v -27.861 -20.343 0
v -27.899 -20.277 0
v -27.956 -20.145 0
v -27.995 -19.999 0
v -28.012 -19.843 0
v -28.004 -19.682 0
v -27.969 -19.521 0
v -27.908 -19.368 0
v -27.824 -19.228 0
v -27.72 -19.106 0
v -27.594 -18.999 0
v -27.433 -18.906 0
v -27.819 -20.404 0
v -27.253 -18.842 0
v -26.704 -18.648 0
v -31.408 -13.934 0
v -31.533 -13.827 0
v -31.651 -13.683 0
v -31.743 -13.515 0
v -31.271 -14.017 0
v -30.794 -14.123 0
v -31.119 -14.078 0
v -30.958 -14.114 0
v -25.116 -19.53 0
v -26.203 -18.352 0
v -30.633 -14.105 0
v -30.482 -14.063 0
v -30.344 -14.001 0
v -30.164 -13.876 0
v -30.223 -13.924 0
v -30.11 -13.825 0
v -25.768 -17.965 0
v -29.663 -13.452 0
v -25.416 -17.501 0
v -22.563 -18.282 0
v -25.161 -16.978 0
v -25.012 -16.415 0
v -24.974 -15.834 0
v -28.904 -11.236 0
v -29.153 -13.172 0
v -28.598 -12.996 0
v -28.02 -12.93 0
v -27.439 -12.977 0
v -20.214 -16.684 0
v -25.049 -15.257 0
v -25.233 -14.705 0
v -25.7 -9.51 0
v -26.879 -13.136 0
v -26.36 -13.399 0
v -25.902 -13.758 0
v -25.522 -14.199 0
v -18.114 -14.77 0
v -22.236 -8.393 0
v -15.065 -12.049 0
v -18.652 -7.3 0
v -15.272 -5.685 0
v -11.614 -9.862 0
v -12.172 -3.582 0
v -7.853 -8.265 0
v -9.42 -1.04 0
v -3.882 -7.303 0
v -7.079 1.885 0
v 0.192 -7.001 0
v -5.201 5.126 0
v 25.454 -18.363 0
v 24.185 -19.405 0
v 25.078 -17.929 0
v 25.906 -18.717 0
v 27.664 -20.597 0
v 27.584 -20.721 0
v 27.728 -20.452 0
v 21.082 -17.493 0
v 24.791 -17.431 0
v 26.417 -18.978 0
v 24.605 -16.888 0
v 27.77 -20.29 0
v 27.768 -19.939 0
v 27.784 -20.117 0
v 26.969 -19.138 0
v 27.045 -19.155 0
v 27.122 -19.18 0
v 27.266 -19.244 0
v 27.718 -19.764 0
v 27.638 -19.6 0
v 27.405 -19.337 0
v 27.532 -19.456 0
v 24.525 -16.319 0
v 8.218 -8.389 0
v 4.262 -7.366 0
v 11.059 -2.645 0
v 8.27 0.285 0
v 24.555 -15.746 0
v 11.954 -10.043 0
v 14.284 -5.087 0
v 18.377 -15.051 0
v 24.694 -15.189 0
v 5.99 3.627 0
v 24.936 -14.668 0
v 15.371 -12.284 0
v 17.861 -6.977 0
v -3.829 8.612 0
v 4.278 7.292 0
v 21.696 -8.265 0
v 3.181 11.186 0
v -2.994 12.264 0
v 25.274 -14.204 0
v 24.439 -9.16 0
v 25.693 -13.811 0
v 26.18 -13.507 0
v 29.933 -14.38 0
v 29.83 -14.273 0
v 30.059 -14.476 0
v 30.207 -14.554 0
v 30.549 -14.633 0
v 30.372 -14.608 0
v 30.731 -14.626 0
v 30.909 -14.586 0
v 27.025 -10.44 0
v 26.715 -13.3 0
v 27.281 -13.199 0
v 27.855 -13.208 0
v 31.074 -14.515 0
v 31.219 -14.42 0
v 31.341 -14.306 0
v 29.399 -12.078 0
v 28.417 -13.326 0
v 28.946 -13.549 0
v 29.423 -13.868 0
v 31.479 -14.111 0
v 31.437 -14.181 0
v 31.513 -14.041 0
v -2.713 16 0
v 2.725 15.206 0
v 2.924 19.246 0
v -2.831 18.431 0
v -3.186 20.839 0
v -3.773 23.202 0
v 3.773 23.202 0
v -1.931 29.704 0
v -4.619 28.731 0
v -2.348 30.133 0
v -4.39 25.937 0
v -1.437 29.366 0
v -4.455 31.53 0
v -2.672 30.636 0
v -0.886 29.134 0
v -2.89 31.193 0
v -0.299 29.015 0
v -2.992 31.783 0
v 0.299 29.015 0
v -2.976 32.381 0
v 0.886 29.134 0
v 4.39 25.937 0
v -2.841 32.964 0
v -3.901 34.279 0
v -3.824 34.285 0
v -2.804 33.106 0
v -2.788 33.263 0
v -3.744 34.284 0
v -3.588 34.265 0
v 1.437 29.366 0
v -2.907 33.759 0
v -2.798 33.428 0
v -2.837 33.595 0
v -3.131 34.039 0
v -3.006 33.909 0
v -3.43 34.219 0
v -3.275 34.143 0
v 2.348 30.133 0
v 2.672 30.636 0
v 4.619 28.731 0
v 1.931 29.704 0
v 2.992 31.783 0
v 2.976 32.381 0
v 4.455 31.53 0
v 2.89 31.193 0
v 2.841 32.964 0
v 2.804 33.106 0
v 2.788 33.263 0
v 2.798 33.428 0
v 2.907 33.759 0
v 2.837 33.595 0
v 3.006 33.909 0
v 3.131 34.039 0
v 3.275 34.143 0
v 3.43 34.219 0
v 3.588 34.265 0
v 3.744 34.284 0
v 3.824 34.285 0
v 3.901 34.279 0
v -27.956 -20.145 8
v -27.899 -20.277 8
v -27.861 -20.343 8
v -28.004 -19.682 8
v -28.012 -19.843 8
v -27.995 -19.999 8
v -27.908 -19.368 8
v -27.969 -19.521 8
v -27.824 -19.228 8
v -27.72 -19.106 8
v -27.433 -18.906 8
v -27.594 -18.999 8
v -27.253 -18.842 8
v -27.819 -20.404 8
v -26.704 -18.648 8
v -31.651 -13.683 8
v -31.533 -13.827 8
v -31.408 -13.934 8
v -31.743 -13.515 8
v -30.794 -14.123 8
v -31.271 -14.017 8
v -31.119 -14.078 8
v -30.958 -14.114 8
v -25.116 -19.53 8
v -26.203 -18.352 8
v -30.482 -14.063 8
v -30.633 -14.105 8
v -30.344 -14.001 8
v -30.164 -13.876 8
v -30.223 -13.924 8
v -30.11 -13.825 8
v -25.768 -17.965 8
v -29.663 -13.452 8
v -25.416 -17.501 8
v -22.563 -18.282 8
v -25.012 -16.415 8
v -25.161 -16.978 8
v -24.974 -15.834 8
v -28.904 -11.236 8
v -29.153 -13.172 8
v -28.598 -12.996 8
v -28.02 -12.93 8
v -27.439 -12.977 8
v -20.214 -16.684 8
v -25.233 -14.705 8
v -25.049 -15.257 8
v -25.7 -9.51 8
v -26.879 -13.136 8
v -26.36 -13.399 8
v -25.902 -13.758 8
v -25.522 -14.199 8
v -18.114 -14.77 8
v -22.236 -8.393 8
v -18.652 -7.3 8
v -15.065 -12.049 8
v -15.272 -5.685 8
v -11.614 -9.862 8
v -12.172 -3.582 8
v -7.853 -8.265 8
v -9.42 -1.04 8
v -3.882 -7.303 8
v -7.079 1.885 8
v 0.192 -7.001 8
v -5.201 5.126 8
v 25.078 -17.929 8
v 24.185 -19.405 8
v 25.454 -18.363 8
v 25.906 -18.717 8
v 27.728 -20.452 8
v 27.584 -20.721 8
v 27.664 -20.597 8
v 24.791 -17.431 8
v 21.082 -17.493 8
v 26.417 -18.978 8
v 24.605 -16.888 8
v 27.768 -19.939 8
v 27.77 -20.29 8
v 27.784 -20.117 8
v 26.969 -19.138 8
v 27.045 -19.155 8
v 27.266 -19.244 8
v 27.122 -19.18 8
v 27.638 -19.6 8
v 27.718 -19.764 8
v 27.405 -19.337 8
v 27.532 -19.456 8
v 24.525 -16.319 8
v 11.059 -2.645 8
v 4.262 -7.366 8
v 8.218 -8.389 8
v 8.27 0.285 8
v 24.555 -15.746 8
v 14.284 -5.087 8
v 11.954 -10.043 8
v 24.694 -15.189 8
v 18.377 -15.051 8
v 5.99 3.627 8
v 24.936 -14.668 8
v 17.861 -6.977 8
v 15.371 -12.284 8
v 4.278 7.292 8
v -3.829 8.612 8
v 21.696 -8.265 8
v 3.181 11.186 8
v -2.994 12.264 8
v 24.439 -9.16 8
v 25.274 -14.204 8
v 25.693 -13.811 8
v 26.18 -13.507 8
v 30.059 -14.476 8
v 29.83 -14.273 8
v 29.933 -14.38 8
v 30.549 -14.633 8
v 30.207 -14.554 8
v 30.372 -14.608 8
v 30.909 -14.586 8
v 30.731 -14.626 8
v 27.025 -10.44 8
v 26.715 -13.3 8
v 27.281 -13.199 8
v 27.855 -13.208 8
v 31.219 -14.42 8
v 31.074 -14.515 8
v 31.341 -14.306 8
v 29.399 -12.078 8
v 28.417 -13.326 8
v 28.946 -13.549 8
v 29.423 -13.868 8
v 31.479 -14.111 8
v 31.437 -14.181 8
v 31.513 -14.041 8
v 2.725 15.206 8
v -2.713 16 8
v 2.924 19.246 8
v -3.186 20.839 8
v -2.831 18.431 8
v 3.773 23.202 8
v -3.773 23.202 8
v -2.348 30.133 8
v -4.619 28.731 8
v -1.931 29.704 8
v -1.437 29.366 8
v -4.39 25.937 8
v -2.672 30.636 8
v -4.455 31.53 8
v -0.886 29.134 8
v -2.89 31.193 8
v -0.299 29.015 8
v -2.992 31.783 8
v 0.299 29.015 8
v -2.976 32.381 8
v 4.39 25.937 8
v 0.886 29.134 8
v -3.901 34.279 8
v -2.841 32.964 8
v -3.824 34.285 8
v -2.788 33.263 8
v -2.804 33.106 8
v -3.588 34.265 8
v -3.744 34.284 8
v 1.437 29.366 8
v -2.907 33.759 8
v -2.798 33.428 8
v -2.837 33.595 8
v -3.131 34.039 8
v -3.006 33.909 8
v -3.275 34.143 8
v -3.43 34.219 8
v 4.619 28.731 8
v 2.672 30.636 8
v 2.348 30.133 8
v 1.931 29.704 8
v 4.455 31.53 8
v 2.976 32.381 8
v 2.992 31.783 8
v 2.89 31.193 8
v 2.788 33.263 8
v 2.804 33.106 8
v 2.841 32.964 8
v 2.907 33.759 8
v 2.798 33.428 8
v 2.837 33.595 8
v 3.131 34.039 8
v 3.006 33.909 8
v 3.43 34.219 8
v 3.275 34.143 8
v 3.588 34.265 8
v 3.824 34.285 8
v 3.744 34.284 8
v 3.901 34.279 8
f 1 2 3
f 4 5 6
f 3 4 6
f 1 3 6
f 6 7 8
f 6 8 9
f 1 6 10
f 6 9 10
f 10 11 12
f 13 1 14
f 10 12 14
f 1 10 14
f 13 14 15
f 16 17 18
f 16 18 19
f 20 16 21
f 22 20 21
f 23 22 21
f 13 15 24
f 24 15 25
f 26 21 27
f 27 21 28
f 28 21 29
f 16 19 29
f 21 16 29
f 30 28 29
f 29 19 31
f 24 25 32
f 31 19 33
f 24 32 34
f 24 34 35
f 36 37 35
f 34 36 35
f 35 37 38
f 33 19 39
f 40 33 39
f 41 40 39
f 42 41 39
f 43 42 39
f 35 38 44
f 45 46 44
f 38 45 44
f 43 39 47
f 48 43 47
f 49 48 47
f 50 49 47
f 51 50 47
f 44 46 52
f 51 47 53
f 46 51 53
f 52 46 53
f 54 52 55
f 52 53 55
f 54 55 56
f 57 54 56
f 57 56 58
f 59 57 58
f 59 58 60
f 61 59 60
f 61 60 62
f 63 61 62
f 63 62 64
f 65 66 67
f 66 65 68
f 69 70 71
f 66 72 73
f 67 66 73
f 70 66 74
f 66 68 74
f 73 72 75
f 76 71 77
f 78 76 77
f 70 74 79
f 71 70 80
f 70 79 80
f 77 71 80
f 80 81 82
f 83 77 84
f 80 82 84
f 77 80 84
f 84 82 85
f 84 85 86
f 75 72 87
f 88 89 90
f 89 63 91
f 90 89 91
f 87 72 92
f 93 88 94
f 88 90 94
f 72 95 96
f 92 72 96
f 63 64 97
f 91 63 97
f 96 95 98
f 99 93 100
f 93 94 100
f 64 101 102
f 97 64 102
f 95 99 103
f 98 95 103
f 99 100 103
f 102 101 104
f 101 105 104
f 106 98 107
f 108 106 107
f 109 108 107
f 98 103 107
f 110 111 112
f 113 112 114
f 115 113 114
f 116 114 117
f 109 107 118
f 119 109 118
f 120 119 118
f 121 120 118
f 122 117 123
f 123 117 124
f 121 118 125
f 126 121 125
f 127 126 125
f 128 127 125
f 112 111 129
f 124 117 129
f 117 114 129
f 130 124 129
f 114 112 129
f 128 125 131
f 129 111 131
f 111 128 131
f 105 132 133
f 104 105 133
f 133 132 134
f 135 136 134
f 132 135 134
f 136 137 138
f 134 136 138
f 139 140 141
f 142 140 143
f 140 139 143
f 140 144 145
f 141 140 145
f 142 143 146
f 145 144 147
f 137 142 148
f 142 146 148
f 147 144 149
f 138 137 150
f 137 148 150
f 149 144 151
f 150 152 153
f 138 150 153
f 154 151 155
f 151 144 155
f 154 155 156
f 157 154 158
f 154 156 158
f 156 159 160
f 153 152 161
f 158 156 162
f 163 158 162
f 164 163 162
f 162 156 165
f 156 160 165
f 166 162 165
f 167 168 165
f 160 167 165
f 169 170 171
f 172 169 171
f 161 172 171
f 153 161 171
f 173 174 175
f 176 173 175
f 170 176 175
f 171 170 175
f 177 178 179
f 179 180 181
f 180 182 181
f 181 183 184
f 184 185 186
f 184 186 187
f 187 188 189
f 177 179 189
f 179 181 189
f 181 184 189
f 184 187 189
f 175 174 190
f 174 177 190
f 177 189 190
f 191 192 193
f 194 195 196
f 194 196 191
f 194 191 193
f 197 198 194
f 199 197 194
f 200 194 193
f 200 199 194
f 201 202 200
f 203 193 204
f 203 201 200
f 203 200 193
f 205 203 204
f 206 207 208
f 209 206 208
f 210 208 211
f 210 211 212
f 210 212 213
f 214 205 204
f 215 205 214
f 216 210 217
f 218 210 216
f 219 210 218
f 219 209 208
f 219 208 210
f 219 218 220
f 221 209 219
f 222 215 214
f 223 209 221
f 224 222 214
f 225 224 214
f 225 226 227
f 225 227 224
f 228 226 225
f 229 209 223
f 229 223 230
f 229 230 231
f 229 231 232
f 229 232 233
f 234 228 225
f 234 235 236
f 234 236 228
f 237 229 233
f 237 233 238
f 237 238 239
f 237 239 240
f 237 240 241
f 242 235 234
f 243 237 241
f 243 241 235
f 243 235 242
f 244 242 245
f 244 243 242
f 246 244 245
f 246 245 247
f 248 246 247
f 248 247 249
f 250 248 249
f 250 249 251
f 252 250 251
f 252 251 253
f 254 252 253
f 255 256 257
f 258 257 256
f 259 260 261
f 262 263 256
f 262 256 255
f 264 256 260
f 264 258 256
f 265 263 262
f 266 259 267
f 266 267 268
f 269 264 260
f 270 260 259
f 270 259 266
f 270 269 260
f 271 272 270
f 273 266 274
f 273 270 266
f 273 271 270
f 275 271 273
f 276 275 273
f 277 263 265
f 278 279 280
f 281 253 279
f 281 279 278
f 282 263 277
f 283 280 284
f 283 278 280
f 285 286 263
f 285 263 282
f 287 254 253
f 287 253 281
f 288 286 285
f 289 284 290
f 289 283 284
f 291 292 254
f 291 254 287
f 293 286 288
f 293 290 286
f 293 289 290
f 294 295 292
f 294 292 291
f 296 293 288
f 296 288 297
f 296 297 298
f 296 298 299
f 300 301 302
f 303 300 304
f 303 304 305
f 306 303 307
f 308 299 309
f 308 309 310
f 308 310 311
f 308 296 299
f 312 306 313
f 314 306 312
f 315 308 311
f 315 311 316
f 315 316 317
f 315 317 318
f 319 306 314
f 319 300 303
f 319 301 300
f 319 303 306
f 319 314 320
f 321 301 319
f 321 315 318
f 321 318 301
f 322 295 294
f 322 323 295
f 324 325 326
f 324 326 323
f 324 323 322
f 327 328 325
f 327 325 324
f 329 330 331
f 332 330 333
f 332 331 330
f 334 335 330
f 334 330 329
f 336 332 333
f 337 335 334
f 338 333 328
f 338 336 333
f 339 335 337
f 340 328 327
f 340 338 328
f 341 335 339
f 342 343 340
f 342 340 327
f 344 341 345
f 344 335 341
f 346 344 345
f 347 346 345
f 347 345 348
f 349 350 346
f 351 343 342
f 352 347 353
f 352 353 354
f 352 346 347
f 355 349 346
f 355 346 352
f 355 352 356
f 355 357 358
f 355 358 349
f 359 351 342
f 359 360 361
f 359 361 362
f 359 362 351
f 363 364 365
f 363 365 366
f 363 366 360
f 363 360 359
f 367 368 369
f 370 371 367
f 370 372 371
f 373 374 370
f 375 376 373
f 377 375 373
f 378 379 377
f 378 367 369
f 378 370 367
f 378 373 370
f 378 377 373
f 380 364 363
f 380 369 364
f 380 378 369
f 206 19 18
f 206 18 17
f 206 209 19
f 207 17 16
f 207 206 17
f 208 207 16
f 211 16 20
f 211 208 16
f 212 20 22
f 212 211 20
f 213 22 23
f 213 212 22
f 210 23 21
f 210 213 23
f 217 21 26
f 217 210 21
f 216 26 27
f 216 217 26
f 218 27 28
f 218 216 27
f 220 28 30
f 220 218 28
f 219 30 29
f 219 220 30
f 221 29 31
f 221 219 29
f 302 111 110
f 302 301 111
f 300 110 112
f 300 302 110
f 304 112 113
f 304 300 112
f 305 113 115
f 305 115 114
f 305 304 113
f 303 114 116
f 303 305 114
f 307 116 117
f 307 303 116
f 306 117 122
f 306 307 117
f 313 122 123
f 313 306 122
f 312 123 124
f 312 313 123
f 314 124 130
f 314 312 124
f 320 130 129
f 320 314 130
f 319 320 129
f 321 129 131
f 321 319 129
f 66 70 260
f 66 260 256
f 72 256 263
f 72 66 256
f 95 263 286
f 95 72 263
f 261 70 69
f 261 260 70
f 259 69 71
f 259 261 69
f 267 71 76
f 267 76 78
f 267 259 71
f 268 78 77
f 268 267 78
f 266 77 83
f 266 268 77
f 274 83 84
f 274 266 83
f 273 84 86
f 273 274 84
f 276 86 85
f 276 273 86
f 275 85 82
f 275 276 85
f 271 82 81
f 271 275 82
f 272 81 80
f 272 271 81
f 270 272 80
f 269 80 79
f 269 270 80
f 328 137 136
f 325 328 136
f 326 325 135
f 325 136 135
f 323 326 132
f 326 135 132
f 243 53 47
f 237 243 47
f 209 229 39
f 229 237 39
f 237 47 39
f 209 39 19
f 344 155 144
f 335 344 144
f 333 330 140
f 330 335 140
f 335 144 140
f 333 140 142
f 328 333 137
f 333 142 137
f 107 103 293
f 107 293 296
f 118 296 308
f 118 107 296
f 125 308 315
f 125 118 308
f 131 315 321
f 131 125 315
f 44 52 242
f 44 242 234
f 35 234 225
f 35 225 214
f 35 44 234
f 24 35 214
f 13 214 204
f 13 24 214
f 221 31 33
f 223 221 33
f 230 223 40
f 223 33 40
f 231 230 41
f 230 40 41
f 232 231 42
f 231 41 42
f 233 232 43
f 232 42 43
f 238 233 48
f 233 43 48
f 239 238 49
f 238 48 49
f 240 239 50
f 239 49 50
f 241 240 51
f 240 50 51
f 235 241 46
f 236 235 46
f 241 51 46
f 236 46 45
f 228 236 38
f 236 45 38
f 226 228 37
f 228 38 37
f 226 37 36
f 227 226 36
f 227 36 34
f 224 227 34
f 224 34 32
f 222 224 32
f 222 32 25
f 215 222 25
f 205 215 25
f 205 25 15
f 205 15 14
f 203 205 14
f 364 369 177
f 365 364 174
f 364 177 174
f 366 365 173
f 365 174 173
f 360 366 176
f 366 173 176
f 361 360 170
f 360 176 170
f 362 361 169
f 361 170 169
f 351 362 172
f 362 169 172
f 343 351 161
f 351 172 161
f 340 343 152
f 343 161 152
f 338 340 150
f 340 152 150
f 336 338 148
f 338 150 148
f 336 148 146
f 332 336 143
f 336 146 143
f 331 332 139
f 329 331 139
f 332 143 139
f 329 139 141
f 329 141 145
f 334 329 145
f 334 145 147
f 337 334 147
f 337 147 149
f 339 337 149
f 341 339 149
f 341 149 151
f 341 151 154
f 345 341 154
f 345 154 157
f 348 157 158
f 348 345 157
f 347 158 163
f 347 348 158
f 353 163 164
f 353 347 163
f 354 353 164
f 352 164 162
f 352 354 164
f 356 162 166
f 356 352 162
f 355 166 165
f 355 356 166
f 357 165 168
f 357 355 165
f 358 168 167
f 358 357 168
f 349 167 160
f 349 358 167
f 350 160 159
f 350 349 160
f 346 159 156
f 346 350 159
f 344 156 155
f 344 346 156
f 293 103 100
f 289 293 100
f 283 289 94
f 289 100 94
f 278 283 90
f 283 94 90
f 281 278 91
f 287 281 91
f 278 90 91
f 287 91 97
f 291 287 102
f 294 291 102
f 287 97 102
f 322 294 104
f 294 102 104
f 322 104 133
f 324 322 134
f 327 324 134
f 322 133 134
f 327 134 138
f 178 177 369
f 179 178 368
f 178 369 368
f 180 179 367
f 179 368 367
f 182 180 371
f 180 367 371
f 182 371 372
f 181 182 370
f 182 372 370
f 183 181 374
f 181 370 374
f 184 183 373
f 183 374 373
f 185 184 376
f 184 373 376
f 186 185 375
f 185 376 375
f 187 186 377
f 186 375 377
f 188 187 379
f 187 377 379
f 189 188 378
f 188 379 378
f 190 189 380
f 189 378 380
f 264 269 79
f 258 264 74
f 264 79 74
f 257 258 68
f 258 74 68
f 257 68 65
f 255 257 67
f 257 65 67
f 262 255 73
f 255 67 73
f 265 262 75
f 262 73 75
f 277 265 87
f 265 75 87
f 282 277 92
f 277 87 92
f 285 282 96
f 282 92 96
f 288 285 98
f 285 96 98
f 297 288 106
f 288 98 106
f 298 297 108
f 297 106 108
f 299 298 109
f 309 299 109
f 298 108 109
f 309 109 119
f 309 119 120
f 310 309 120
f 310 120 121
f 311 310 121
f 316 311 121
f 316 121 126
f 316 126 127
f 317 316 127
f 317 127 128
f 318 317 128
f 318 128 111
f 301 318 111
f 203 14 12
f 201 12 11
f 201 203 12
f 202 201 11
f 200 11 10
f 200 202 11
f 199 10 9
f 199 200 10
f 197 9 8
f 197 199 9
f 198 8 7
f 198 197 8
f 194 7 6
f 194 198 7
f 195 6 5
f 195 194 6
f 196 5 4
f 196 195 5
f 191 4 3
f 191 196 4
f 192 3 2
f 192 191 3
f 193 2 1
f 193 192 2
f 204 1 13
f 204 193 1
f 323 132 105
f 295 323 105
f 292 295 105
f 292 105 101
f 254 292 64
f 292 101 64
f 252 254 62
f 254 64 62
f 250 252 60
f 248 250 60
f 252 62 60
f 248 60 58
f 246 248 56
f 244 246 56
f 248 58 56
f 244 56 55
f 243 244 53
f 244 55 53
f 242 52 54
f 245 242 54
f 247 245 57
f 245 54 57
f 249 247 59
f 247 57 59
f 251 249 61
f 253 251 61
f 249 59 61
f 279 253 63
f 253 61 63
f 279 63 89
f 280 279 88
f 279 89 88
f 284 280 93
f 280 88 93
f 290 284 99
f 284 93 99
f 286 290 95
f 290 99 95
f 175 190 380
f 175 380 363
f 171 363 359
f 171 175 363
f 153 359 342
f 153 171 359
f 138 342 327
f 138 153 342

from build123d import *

# Parameters (mm, degrees)
F1_DEPTH    = 8
F2_R        = 1
F3_T1_DEPTH = 64.2226111809
F3_T3_DEPTH = 65.5041643561
F3_T5_DEPTH = 66.9229315715
F3_T7_DEPTH = 64.2892221554
F3_T9_DEPTH = 66.1623607225


# Not quite as in the source:
# - a fillet or chamfer that OpenCascade refuses, or shapes differently, is made with other operations: its cross-section is extruded or revolved along the edge and cut away or added


with BuildPart() as f1:
    # F0 (on Top) → F1 (new body)
    with BuildSketch(Plane.XY):
        with BuildLine():
            ThreePointArc((1.7213359453, 34.45703125), (0, 29), (-1.7213359453, 34.45703125))
            ThreePointArc((-1.7213359453, 34.45703125), (-5.6630518779, 34.0320414232), (-9.5299848811, 33.1576444906))
            ThreePointArc((-9.5299848811, 33.1576444906), (-4.4795318248, 25.2311781209), (-2.7128129211, 16))
            ThreePointArc((-2.7128129211, 16), (-12.2077903389, -3.6110753077), (-33.4803548991, -8.3256132406))
            ThreePointArc((-33.4803548991, -8.3256132406), (-32.3848639744, -11.8941407997), (-30.9102371196, -15.3234213285))
            ThreePointArc((-30.9102371196, -15.3234213285), (-25.3652162283, -14.4450583373), (-28.9498248331, -18.7658637459))
            ThreePointArc((-28.9498248331, -18.7658637459), (-26.6234342426, -21.9418036891), (-23.950370018, -24.83203125))
            ThreePointArc((-23.950370018, -24.83203125), (0, -7), (23.950370018, -24.83203125))
            ThreePointArc((23.950370018, -24.83203125), (26.587584538, -21.9852302339), (28.8884099574, -18.8602696198))
            ThreePointArc((28.8884099574, -18.8602696198), (24.9364218636, -14.6683482508), (30.5204410338, -16.0857912178))
            ThreePointArc((30.5204410338, -16.0857912178), (32.2347725379, -12.2950981871), (33.4803548991, -8.3256132406))
            ThreePointArc((33.4803548991, -8.3256132406), (6.0621778265, 3.5), (9.5299848811, 33.1576444906))
            ThreePointArc((9.5299848811, 33.1576444906), (5.6630518779, 34.0320414232), (1.7213359453, 34.45703125))
        make_face()
    extrude(amount=F1_DEPTH)

    # F2
    f2_edges = [f1.edges().sort_by_distance(p)[0] for p in [
        (-30.910237, -15.323421, 4),
        (-28.949825, -18.765864, 4),
        (1.721336, 34.457031, 4),
        (-1.721336, 34.457031, 4),
        (28.88841, -18.86027, 4),
        (30.520441, -16.085791, 4),
    ]]
    fillet(f2_edges, radius=F2_R)

    # F3: fillet of radius 20 on 6 edges, made by hand

    # F3_s2 → F3_t1 (cut)
    with BuildSketch(Plane.XY.offset(-28.1113055904)):
        with BuildLine():
            ThreePointArc((-22.2360329208, -8.3927218823), (-27.3415731158, -10.3001532277), (-31.7425915451, -13.5150982979))
            ThreePointArc((-31.7425915451, -13.5150982979), (-32.7145361346, -10.9548676622), (-33.4803548991, -8.3256132406))
            ThreePointArc((-33.4803548991, -8.3256132406), (-27.8620158848, -8.9995547655), (-22.2360329208, -8.3927218823))
        make_face()
    extrude(amount=F3_T1_DEPTH, mode=Mode.SUBTRACT)

    # F3_s4 → F3_t3 (cut)
    with BuildSketch(Plane.XY.offset(-28.7520821781)):
        with BuildLine():
            ThreePointArc((-3.9009970628, 34.2787430037), (-4.619010619, 28.731142286), (-3.7725584788, 23.2016815561))
            ThreePointArc((-3.7725584788, 23.2016815561), (-6.0709826163, 28.5152379545), (-9.5299848811, 33.1576444906))
            ThreePointArc((-9.5299848811, 33.1576444906), (-6.7388451877, 33.8354542682), (-3.9009970628, 34.2787430037))
        make_face()
        with BuildLine():
            ThreePointArc((3.9009970628, 34.2787430037), (4.619010619, 28.731142286), (3.7725584788, 23.2016815561))
            ThreePointArc((3.7725584788, 23.2016815561), (6.0709826163, 28.5152379545), (9.5299848811, 33.1576444906))
            ThreePointArc((9.5299848811, 33.1576444906), (6.7388451877, 33.8354542682), (3.9009970628, 34.2787430037))
        make_face()
    extrude(amount=F3_T3_DEPTH, mode=Mode.SUBTRACT)

    # F3_s6 → F3_t5 (cut)
    with BuildSketch(Plane.XY.offset(-29.4614657857)):
        with BuildLine():
            ThreePointArc((21.695923744, -8.2651405236), (27.0245333746, -10.4395796023), (31.513317936, -14.0413956808))
            ThreePointArc((31.513317936, -14.0413956808), (32.6222611015, -11.2266682781), (33.4803548991, -8.3256132406))
            ThreePointArc((33.4803548991, -8.3256132406), (27.5845251828, -8.999670843), (21.695923744, -8.2651405236))
        make_face()
    extrude(amount=F3_T5_DEPTH, mode=Mode.SUBTRACT)

    # F3_s8 → F3_t7 (cut)
    with BuildSketch(Plane.XY.offset(-28.1446110777)):
        with BuildLine():
            ThreePointArc((27.5839500196, -20.7213827076), (22.5899865116, -18.5199962805), (18.3770596718, -15.0505552356))
            ThreePointArc((18.3770596718, -15.0505552356), (21.7214673604, -19.6234958203), (23.950370018, -24.83203125))
            ThreePointArc((23.950370018, -24.83203125), (25.8490017853, -22.8490504552), (27.5839500196, -20.7213827076))
        make_face()
    extrude(amount=F3_T7_DEPTH, mode=Mode.SUBTRACT)

    # F3_s10 → F3_t9 (cut)
    with BuildSketch(Plane.XY.offset(-29.0811803612)):
        with BuildLine():
            ThreePointArc((-18.1139750308, -14.7696805432), (-22.5633062196, -18.281704114), (-27.8192704457, -20.4043669804))
            ThreePointArc((-27.8192704457, -20.4043669804), (-25.9793181426, -22.7007715474), (-23.950370018, -24.83203125))
            ThreePointArc((-23.950370018, -24.83203125), (-21.6255637275, -19.4566753424), (-18.1139750308, -14.7696805432))
        make_face()
    extrude(amount=F3_T9_DEPTH, mode=Mode.SUBTRACT)


solid = f1.part
